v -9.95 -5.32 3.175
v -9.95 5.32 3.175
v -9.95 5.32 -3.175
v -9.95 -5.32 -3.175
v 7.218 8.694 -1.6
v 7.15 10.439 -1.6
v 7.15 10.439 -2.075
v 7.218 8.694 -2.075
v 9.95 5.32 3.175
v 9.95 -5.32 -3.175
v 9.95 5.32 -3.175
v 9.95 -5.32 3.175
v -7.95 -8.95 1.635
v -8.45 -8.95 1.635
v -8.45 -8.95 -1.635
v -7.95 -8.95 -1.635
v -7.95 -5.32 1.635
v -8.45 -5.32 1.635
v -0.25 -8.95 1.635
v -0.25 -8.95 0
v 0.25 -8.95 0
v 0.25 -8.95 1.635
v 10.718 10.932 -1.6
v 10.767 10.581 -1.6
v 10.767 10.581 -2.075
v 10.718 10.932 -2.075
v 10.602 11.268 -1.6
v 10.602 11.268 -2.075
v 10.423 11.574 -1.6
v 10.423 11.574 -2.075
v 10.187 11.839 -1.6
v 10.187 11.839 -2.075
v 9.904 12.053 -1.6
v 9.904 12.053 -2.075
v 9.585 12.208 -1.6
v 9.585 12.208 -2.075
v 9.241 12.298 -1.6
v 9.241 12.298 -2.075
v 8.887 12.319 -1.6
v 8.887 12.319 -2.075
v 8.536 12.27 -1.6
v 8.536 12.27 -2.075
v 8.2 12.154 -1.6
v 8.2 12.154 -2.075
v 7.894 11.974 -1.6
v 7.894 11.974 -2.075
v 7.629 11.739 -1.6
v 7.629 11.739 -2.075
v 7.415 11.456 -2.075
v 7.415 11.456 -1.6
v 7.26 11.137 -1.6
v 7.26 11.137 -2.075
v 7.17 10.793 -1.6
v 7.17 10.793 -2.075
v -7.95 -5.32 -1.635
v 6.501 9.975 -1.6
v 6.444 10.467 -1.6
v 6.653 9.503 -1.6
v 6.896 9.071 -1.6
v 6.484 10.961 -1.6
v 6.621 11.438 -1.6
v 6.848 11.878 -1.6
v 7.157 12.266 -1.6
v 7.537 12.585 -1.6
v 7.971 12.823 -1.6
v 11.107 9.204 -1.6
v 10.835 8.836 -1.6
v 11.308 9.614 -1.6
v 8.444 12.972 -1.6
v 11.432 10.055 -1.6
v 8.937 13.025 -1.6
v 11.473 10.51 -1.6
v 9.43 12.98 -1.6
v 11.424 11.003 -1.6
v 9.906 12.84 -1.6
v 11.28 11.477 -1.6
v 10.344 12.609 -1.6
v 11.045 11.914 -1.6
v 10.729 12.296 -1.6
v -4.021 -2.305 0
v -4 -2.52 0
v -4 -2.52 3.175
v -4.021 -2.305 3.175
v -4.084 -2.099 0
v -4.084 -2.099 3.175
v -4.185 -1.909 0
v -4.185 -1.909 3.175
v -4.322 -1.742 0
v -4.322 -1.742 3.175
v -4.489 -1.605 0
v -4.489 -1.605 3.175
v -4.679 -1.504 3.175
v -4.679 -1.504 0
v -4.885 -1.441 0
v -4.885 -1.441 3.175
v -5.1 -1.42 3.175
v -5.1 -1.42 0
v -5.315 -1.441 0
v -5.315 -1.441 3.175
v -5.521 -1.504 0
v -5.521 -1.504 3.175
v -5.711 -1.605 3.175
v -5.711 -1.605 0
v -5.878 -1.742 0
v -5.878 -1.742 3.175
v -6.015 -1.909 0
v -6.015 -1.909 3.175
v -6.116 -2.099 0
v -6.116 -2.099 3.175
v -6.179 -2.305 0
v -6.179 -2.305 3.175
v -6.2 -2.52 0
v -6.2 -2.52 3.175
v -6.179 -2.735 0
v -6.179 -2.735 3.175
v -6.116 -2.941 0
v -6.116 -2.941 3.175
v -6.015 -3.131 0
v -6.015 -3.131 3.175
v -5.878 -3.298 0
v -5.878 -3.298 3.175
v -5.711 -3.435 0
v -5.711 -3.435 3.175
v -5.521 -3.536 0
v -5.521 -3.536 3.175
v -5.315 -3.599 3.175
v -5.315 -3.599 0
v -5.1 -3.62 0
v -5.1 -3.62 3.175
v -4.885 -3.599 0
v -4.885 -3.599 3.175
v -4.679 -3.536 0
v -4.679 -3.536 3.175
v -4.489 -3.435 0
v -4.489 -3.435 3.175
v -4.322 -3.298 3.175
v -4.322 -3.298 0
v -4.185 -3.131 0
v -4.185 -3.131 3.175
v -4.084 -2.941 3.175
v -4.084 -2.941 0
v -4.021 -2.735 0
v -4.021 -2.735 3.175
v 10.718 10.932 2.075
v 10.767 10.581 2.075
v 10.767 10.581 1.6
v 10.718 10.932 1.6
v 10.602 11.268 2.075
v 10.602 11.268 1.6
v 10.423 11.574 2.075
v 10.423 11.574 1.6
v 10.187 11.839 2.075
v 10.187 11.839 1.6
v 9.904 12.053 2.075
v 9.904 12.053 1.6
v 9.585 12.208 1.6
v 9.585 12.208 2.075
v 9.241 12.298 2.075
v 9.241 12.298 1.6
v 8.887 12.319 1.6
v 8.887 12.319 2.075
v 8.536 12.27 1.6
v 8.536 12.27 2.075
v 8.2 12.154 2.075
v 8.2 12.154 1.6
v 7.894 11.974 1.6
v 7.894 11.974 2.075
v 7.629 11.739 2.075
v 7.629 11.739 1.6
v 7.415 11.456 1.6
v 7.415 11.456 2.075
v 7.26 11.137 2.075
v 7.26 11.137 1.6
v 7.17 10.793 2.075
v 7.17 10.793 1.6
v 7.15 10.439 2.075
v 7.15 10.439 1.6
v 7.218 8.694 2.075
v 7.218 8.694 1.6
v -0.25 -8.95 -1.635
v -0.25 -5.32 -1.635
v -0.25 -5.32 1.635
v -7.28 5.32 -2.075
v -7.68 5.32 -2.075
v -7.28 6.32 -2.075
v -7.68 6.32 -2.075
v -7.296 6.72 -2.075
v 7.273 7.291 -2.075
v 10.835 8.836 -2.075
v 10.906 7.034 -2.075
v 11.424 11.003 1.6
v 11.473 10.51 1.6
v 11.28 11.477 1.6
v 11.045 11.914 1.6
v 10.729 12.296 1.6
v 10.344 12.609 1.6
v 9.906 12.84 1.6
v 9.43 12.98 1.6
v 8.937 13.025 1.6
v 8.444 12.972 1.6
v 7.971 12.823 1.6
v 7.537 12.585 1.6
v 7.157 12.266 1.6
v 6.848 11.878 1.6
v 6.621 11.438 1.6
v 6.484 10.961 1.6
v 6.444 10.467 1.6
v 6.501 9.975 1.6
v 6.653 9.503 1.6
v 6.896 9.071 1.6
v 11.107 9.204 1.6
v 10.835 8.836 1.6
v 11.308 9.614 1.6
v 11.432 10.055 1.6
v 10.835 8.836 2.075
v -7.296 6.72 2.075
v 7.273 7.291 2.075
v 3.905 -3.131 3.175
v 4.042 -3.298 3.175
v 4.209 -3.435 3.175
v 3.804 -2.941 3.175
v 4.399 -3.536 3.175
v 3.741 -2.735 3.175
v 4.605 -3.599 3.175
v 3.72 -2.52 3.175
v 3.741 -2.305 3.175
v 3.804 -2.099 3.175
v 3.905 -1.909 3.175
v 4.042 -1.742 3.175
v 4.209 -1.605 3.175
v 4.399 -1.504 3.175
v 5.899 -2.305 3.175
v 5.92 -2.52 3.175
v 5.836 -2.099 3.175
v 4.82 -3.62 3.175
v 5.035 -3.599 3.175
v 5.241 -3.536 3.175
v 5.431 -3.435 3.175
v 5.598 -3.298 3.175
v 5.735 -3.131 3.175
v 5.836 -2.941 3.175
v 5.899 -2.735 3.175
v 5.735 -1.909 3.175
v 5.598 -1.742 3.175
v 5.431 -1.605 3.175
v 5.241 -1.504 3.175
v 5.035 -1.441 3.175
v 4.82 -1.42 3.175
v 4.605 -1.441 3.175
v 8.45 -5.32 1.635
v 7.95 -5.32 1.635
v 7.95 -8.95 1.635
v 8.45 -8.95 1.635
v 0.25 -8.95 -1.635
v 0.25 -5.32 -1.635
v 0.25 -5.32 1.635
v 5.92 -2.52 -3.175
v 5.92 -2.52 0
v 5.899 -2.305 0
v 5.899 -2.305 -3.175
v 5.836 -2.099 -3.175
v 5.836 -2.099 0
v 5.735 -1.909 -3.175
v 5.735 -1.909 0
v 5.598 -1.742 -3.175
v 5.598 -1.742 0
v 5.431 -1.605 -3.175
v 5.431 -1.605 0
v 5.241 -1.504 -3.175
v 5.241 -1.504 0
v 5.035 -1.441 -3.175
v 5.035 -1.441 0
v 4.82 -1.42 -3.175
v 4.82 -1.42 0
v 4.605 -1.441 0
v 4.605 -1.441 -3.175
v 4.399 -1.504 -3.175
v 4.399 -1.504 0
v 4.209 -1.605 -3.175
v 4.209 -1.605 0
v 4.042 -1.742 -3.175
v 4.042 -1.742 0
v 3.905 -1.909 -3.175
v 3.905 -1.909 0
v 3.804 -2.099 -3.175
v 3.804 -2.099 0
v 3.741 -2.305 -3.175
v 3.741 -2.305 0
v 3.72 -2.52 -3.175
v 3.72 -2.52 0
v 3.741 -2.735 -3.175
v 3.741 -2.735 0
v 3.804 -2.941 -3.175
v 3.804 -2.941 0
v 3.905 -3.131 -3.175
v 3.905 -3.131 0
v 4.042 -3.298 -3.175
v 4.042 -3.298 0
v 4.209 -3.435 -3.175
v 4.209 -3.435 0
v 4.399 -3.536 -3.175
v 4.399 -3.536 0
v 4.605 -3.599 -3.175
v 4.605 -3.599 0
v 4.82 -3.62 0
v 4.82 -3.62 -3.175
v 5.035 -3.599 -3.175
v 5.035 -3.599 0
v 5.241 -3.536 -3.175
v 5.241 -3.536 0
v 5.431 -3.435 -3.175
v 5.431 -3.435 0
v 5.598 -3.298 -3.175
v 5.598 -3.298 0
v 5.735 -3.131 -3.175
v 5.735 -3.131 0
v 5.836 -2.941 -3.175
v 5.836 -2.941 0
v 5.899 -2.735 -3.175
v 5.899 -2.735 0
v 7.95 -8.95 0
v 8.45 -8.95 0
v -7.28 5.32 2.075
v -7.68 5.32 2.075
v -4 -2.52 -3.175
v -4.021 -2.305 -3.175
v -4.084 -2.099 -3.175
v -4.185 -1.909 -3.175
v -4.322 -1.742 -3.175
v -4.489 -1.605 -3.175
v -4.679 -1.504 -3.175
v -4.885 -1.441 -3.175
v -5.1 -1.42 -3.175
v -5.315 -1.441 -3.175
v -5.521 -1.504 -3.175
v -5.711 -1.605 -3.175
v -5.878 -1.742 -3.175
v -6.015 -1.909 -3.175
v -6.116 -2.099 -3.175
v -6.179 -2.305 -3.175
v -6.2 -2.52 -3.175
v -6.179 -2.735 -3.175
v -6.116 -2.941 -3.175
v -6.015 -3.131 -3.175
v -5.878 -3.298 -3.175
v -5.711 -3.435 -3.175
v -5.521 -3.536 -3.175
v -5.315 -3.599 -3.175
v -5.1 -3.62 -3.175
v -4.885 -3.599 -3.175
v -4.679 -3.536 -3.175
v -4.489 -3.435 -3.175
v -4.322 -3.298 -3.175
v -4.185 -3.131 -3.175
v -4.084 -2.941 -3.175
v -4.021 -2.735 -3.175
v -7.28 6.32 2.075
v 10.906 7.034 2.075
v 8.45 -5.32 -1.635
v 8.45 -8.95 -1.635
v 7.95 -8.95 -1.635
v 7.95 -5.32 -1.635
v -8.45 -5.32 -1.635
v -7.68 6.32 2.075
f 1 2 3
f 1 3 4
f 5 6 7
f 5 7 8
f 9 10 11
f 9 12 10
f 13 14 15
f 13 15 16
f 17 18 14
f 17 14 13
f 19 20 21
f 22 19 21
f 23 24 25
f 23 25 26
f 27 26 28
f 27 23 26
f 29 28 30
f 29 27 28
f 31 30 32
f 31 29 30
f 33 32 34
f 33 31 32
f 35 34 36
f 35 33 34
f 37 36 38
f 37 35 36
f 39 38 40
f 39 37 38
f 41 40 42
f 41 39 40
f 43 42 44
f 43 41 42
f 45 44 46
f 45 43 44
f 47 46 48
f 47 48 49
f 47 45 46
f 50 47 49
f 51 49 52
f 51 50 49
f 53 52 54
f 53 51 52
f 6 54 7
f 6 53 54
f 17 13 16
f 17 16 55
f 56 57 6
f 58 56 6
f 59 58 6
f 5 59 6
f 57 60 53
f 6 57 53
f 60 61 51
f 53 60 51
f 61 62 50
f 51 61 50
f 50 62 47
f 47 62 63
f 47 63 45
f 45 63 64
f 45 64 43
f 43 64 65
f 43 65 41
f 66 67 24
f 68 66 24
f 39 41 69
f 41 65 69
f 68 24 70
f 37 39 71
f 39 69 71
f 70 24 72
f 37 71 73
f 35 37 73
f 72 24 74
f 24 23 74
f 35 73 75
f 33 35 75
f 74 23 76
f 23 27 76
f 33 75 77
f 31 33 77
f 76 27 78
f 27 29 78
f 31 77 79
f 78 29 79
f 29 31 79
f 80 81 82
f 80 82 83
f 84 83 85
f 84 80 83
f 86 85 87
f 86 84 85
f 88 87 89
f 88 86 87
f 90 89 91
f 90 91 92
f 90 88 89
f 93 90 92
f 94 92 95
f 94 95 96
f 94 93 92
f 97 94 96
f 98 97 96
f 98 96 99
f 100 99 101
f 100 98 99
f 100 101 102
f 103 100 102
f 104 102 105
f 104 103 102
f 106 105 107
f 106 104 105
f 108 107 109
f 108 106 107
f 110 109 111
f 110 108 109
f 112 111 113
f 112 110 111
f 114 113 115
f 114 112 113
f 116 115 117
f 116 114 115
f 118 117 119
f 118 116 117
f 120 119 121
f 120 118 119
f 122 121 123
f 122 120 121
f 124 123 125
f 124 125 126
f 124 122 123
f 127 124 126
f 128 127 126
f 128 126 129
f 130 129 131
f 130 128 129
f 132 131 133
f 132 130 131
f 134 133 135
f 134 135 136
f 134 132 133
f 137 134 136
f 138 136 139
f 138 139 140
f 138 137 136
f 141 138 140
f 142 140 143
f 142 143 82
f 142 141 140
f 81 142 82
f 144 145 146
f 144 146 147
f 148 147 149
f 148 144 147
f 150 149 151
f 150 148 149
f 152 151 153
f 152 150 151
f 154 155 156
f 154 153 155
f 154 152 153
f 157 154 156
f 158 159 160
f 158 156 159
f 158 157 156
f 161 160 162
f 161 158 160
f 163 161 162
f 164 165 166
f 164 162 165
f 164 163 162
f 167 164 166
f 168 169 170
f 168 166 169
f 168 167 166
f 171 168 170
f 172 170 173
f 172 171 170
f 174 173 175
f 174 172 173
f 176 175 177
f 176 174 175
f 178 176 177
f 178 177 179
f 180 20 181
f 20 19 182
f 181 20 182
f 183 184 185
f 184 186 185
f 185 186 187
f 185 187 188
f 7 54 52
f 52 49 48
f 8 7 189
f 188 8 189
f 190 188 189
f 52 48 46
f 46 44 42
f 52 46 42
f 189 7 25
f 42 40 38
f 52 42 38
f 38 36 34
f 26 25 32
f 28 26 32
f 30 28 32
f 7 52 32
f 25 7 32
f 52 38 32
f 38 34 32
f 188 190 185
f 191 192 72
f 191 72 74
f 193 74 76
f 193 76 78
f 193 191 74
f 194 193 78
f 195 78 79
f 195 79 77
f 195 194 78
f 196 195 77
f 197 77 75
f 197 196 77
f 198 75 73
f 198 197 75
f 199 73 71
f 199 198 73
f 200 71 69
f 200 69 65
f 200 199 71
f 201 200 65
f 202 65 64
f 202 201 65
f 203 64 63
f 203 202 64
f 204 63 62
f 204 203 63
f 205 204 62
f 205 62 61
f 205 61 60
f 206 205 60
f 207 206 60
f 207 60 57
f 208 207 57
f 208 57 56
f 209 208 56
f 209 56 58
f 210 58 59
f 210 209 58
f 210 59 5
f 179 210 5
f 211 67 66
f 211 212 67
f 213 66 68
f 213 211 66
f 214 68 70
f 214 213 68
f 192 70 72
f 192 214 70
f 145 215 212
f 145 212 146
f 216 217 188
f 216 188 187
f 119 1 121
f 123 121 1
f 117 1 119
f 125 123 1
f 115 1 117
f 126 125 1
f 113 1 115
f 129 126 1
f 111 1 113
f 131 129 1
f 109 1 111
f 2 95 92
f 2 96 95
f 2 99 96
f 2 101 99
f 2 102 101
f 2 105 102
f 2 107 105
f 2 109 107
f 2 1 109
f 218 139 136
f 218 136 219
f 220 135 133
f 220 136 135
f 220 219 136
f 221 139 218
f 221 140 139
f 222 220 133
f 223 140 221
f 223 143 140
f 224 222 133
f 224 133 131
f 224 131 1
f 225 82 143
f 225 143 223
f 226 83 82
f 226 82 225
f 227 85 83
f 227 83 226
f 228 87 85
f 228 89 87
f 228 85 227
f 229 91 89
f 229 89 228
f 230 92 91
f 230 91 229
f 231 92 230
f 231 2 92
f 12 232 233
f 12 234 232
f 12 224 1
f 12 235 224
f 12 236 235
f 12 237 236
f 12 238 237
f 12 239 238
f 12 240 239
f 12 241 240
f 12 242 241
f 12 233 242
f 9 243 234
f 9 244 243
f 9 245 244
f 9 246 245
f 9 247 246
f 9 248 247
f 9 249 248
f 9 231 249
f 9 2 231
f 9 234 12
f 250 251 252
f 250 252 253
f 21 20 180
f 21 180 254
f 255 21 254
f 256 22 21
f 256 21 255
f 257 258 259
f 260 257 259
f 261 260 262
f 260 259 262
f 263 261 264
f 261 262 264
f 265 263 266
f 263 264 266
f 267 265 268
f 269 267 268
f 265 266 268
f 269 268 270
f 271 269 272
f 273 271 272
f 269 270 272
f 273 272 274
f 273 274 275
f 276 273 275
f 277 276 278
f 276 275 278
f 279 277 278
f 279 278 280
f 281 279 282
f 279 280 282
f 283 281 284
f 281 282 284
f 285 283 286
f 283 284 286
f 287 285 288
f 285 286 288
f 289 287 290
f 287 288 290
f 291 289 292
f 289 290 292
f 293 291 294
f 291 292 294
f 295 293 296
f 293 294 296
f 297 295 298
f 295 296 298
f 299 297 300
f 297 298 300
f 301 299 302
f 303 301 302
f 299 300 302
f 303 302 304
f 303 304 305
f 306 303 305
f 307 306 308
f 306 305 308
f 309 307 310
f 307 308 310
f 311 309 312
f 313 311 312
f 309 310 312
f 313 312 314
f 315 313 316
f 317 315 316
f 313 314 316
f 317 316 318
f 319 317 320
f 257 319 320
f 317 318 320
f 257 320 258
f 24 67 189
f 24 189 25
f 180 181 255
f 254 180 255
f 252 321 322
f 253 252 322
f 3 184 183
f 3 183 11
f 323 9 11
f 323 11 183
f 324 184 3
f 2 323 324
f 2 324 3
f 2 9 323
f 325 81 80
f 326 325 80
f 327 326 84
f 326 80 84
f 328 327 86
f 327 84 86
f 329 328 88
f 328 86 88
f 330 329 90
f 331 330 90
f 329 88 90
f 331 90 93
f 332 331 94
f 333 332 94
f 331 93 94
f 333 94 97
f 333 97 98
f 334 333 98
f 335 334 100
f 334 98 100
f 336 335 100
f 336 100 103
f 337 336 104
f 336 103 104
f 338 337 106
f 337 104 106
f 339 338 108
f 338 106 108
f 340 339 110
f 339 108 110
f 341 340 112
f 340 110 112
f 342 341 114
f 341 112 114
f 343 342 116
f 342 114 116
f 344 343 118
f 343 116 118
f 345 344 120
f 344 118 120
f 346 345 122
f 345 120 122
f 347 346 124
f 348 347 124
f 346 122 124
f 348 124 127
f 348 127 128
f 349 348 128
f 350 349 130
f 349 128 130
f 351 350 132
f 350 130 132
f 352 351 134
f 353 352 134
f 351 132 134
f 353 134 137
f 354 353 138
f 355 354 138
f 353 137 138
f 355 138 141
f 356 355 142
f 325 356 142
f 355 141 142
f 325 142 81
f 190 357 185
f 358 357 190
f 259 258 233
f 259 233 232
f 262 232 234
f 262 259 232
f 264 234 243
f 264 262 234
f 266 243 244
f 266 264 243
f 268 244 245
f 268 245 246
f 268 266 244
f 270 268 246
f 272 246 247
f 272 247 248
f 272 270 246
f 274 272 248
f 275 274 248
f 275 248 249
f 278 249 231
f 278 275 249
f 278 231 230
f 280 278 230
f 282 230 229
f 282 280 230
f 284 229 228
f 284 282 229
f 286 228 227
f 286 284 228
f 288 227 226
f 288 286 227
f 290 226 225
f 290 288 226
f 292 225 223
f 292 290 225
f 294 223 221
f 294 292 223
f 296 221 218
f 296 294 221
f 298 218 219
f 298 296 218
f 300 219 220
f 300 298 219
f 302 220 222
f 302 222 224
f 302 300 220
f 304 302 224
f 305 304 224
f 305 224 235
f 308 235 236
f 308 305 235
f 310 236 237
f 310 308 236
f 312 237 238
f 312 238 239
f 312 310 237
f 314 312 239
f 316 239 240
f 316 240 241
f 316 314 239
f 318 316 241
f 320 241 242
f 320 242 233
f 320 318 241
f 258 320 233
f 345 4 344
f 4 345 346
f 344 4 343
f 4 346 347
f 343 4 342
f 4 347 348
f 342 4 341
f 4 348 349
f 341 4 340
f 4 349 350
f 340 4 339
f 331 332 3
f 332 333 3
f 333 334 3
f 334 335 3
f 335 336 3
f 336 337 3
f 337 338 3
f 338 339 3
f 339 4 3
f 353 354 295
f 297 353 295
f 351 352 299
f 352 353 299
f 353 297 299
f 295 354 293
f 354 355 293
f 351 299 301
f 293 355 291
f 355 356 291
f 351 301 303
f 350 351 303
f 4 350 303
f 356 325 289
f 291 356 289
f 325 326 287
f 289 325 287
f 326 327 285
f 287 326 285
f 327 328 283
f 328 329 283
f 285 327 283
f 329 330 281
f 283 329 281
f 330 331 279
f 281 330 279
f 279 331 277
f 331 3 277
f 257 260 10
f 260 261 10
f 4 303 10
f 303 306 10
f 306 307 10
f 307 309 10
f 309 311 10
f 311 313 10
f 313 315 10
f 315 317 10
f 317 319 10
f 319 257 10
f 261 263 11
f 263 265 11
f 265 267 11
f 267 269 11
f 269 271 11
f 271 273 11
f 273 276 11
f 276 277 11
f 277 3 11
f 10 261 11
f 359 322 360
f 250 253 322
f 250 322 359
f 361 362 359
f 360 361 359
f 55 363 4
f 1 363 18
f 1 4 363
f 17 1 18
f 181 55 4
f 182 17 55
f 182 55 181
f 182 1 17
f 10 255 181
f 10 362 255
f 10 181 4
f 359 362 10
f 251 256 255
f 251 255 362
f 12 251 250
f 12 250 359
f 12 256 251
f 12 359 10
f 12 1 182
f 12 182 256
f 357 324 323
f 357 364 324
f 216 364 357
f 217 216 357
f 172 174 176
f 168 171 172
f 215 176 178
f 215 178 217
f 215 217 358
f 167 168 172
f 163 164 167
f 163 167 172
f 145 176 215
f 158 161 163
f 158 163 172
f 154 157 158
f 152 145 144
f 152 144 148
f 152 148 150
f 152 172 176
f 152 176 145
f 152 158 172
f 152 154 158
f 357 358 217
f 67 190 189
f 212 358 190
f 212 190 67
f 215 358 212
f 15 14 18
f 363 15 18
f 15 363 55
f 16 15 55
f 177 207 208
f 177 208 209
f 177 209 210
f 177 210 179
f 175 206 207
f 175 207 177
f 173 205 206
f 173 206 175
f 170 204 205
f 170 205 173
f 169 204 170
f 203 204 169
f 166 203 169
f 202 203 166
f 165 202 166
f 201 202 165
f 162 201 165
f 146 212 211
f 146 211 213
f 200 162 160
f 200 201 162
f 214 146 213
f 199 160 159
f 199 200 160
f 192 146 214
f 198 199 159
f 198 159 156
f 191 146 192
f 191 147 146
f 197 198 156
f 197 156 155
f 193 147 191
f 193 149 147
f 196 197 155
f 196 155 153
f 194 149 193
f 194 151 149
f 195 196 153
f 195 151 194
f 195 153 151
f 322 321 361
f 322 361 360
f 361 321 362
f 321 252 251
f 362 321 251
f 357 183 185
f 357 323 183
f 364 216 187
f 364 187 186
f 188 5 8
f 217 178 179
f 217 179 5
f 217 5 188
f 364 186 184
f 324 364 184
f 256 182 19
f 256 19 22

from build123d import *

# Parameters (mm, degrees)
F0_R          = 1.1
F1_DEPTH      = 3.175
F1_DEPTH_BACK = 3.175
F2_DEPTH      = 2.075
F2_DEPTH_BACK = 2.075
F0_W          = 0.5
F0_H          = 3.63
F3_DEPTH      = 1.635
F3_DEPTH_BACK = 1.635
F4_DEPTH      = 1.6
F4_DEPTH_BACK = 1.6


with BuildPart() as f1:
    # F0 (on Top) → F1 (new body, two sides)
    with BuildSketch(Plane.XY) as f1_sk:
        Polygon((8.45, -5.32), (9.95, -5.32), (9.95, 5.32), (0, 5.32), (-7.28, 5.32), (-7.68, 5.32), (-9.95, 5.32), (-9.95, -5.32), (-8.45, -5.32), (-7.95, -5.32), (-0.25, -5.32), (0.25, -5.32), (7.95, -5.32), align=None)
        with Locations((-5.1, -2.52)):
            Circle(F0_R, mode=Mode.SUBTRACT)
        with Locations((4.82, -2.52)):
            Circle(F0_R, mode=Mode.SUBTRACT)
    extrude(amount=F1_DEPTH)
    extrude(f1_sk.sketch, amount=-F1_DEPTH_BACK)

    # F0 (on Top) → F2 (join, two sides)
    with BuildSketch(Plane.XY) as f2_sk:
        with BuildLine():
            Line((-7.68, 5.32), (-7.28, 5.32))
            Line((-7.28, 5.32), (-7.28, 6.32))
            Line((-7.28, 6.32), (10.906001, 7.033709))
            Line((10.906001, 7.033709), (10.835264, 8.836148))
            ThreePointArc((10.835264, 8.836148), (9.056806, 7.996935), (7.218048, 8.69419))
            Line((7.218048, 8.69419), (7.273099, 7.291444))
            Line((7.273099, 7.291444), (-7.295686, 6.719692))
            Line((-7.295686, 6.719692), (-7.68, 6.32))
            Line((-7.68, 6.32), (-7.68, 5.32))
        make_face()
        with BuildLine():
            ThreePointArc((7.218048, 8.69419), (9.056806, 7.996935), (10.835264, 8.836148))
            Line((10.835264, 8.836148), (10.766788, 10.580979))
            ThreePointArc((10.766788, 10.580979), (8.887202, 12.318608), (7.149573, 10.439021))
            Line((7.149573, 10.439021), (7.218048, 8.69419))
        make_face()
    extrude(amount=F2_DEPTH)
    extrude(f2_sk.sketch, amount=-F2_DEPTH_BACK)

    # F0 (on Top) → F3 (join, two sides)
    with BuildSketch(Plane.XY) as f3_sk:
        with Locations((-8.2, -7.135)):
            Rectangle(F0_W, F0_H)
        with Locations((8.2, -7.135)):
            Rectangle(F0_W, F0_H)
        with Locations((0, -7.135)):
            Rectangle(F0_W, F0_H)
    extrude(amount=F3_DEPTH)
    extrude(f3_sk.sketch, amount=-F3_DEPTH_BACK)

    # F0 (on Top) → F4 (join, two sides)
    with BuildSketch(Plane.XY) as f4_sk:
        with BuildLine():
            Line((10.766788, 10.580979), (10.835264, 8.836148))
            ThreePointArc((10.835264, 8.836148), (11.308296, 9.614355), (11.47318, 10.51))
            ThreePointArc((11.47318, 10.51), (7.971065, 12.823186), (7.218048, 8.69419))
            Line((7.218048, 8.69419), (7.149573, 10.439021))
            ThreePointArc((7.149573, 10.439021), (8.887202, 12.318608), (10.766788, 10.580979))
        make_face()
    extrude(amount=F4_DEPTH)
    extrude(f4_sk.sketch, amount=-F4_DEPTH_BACK)


solid = f1.part
